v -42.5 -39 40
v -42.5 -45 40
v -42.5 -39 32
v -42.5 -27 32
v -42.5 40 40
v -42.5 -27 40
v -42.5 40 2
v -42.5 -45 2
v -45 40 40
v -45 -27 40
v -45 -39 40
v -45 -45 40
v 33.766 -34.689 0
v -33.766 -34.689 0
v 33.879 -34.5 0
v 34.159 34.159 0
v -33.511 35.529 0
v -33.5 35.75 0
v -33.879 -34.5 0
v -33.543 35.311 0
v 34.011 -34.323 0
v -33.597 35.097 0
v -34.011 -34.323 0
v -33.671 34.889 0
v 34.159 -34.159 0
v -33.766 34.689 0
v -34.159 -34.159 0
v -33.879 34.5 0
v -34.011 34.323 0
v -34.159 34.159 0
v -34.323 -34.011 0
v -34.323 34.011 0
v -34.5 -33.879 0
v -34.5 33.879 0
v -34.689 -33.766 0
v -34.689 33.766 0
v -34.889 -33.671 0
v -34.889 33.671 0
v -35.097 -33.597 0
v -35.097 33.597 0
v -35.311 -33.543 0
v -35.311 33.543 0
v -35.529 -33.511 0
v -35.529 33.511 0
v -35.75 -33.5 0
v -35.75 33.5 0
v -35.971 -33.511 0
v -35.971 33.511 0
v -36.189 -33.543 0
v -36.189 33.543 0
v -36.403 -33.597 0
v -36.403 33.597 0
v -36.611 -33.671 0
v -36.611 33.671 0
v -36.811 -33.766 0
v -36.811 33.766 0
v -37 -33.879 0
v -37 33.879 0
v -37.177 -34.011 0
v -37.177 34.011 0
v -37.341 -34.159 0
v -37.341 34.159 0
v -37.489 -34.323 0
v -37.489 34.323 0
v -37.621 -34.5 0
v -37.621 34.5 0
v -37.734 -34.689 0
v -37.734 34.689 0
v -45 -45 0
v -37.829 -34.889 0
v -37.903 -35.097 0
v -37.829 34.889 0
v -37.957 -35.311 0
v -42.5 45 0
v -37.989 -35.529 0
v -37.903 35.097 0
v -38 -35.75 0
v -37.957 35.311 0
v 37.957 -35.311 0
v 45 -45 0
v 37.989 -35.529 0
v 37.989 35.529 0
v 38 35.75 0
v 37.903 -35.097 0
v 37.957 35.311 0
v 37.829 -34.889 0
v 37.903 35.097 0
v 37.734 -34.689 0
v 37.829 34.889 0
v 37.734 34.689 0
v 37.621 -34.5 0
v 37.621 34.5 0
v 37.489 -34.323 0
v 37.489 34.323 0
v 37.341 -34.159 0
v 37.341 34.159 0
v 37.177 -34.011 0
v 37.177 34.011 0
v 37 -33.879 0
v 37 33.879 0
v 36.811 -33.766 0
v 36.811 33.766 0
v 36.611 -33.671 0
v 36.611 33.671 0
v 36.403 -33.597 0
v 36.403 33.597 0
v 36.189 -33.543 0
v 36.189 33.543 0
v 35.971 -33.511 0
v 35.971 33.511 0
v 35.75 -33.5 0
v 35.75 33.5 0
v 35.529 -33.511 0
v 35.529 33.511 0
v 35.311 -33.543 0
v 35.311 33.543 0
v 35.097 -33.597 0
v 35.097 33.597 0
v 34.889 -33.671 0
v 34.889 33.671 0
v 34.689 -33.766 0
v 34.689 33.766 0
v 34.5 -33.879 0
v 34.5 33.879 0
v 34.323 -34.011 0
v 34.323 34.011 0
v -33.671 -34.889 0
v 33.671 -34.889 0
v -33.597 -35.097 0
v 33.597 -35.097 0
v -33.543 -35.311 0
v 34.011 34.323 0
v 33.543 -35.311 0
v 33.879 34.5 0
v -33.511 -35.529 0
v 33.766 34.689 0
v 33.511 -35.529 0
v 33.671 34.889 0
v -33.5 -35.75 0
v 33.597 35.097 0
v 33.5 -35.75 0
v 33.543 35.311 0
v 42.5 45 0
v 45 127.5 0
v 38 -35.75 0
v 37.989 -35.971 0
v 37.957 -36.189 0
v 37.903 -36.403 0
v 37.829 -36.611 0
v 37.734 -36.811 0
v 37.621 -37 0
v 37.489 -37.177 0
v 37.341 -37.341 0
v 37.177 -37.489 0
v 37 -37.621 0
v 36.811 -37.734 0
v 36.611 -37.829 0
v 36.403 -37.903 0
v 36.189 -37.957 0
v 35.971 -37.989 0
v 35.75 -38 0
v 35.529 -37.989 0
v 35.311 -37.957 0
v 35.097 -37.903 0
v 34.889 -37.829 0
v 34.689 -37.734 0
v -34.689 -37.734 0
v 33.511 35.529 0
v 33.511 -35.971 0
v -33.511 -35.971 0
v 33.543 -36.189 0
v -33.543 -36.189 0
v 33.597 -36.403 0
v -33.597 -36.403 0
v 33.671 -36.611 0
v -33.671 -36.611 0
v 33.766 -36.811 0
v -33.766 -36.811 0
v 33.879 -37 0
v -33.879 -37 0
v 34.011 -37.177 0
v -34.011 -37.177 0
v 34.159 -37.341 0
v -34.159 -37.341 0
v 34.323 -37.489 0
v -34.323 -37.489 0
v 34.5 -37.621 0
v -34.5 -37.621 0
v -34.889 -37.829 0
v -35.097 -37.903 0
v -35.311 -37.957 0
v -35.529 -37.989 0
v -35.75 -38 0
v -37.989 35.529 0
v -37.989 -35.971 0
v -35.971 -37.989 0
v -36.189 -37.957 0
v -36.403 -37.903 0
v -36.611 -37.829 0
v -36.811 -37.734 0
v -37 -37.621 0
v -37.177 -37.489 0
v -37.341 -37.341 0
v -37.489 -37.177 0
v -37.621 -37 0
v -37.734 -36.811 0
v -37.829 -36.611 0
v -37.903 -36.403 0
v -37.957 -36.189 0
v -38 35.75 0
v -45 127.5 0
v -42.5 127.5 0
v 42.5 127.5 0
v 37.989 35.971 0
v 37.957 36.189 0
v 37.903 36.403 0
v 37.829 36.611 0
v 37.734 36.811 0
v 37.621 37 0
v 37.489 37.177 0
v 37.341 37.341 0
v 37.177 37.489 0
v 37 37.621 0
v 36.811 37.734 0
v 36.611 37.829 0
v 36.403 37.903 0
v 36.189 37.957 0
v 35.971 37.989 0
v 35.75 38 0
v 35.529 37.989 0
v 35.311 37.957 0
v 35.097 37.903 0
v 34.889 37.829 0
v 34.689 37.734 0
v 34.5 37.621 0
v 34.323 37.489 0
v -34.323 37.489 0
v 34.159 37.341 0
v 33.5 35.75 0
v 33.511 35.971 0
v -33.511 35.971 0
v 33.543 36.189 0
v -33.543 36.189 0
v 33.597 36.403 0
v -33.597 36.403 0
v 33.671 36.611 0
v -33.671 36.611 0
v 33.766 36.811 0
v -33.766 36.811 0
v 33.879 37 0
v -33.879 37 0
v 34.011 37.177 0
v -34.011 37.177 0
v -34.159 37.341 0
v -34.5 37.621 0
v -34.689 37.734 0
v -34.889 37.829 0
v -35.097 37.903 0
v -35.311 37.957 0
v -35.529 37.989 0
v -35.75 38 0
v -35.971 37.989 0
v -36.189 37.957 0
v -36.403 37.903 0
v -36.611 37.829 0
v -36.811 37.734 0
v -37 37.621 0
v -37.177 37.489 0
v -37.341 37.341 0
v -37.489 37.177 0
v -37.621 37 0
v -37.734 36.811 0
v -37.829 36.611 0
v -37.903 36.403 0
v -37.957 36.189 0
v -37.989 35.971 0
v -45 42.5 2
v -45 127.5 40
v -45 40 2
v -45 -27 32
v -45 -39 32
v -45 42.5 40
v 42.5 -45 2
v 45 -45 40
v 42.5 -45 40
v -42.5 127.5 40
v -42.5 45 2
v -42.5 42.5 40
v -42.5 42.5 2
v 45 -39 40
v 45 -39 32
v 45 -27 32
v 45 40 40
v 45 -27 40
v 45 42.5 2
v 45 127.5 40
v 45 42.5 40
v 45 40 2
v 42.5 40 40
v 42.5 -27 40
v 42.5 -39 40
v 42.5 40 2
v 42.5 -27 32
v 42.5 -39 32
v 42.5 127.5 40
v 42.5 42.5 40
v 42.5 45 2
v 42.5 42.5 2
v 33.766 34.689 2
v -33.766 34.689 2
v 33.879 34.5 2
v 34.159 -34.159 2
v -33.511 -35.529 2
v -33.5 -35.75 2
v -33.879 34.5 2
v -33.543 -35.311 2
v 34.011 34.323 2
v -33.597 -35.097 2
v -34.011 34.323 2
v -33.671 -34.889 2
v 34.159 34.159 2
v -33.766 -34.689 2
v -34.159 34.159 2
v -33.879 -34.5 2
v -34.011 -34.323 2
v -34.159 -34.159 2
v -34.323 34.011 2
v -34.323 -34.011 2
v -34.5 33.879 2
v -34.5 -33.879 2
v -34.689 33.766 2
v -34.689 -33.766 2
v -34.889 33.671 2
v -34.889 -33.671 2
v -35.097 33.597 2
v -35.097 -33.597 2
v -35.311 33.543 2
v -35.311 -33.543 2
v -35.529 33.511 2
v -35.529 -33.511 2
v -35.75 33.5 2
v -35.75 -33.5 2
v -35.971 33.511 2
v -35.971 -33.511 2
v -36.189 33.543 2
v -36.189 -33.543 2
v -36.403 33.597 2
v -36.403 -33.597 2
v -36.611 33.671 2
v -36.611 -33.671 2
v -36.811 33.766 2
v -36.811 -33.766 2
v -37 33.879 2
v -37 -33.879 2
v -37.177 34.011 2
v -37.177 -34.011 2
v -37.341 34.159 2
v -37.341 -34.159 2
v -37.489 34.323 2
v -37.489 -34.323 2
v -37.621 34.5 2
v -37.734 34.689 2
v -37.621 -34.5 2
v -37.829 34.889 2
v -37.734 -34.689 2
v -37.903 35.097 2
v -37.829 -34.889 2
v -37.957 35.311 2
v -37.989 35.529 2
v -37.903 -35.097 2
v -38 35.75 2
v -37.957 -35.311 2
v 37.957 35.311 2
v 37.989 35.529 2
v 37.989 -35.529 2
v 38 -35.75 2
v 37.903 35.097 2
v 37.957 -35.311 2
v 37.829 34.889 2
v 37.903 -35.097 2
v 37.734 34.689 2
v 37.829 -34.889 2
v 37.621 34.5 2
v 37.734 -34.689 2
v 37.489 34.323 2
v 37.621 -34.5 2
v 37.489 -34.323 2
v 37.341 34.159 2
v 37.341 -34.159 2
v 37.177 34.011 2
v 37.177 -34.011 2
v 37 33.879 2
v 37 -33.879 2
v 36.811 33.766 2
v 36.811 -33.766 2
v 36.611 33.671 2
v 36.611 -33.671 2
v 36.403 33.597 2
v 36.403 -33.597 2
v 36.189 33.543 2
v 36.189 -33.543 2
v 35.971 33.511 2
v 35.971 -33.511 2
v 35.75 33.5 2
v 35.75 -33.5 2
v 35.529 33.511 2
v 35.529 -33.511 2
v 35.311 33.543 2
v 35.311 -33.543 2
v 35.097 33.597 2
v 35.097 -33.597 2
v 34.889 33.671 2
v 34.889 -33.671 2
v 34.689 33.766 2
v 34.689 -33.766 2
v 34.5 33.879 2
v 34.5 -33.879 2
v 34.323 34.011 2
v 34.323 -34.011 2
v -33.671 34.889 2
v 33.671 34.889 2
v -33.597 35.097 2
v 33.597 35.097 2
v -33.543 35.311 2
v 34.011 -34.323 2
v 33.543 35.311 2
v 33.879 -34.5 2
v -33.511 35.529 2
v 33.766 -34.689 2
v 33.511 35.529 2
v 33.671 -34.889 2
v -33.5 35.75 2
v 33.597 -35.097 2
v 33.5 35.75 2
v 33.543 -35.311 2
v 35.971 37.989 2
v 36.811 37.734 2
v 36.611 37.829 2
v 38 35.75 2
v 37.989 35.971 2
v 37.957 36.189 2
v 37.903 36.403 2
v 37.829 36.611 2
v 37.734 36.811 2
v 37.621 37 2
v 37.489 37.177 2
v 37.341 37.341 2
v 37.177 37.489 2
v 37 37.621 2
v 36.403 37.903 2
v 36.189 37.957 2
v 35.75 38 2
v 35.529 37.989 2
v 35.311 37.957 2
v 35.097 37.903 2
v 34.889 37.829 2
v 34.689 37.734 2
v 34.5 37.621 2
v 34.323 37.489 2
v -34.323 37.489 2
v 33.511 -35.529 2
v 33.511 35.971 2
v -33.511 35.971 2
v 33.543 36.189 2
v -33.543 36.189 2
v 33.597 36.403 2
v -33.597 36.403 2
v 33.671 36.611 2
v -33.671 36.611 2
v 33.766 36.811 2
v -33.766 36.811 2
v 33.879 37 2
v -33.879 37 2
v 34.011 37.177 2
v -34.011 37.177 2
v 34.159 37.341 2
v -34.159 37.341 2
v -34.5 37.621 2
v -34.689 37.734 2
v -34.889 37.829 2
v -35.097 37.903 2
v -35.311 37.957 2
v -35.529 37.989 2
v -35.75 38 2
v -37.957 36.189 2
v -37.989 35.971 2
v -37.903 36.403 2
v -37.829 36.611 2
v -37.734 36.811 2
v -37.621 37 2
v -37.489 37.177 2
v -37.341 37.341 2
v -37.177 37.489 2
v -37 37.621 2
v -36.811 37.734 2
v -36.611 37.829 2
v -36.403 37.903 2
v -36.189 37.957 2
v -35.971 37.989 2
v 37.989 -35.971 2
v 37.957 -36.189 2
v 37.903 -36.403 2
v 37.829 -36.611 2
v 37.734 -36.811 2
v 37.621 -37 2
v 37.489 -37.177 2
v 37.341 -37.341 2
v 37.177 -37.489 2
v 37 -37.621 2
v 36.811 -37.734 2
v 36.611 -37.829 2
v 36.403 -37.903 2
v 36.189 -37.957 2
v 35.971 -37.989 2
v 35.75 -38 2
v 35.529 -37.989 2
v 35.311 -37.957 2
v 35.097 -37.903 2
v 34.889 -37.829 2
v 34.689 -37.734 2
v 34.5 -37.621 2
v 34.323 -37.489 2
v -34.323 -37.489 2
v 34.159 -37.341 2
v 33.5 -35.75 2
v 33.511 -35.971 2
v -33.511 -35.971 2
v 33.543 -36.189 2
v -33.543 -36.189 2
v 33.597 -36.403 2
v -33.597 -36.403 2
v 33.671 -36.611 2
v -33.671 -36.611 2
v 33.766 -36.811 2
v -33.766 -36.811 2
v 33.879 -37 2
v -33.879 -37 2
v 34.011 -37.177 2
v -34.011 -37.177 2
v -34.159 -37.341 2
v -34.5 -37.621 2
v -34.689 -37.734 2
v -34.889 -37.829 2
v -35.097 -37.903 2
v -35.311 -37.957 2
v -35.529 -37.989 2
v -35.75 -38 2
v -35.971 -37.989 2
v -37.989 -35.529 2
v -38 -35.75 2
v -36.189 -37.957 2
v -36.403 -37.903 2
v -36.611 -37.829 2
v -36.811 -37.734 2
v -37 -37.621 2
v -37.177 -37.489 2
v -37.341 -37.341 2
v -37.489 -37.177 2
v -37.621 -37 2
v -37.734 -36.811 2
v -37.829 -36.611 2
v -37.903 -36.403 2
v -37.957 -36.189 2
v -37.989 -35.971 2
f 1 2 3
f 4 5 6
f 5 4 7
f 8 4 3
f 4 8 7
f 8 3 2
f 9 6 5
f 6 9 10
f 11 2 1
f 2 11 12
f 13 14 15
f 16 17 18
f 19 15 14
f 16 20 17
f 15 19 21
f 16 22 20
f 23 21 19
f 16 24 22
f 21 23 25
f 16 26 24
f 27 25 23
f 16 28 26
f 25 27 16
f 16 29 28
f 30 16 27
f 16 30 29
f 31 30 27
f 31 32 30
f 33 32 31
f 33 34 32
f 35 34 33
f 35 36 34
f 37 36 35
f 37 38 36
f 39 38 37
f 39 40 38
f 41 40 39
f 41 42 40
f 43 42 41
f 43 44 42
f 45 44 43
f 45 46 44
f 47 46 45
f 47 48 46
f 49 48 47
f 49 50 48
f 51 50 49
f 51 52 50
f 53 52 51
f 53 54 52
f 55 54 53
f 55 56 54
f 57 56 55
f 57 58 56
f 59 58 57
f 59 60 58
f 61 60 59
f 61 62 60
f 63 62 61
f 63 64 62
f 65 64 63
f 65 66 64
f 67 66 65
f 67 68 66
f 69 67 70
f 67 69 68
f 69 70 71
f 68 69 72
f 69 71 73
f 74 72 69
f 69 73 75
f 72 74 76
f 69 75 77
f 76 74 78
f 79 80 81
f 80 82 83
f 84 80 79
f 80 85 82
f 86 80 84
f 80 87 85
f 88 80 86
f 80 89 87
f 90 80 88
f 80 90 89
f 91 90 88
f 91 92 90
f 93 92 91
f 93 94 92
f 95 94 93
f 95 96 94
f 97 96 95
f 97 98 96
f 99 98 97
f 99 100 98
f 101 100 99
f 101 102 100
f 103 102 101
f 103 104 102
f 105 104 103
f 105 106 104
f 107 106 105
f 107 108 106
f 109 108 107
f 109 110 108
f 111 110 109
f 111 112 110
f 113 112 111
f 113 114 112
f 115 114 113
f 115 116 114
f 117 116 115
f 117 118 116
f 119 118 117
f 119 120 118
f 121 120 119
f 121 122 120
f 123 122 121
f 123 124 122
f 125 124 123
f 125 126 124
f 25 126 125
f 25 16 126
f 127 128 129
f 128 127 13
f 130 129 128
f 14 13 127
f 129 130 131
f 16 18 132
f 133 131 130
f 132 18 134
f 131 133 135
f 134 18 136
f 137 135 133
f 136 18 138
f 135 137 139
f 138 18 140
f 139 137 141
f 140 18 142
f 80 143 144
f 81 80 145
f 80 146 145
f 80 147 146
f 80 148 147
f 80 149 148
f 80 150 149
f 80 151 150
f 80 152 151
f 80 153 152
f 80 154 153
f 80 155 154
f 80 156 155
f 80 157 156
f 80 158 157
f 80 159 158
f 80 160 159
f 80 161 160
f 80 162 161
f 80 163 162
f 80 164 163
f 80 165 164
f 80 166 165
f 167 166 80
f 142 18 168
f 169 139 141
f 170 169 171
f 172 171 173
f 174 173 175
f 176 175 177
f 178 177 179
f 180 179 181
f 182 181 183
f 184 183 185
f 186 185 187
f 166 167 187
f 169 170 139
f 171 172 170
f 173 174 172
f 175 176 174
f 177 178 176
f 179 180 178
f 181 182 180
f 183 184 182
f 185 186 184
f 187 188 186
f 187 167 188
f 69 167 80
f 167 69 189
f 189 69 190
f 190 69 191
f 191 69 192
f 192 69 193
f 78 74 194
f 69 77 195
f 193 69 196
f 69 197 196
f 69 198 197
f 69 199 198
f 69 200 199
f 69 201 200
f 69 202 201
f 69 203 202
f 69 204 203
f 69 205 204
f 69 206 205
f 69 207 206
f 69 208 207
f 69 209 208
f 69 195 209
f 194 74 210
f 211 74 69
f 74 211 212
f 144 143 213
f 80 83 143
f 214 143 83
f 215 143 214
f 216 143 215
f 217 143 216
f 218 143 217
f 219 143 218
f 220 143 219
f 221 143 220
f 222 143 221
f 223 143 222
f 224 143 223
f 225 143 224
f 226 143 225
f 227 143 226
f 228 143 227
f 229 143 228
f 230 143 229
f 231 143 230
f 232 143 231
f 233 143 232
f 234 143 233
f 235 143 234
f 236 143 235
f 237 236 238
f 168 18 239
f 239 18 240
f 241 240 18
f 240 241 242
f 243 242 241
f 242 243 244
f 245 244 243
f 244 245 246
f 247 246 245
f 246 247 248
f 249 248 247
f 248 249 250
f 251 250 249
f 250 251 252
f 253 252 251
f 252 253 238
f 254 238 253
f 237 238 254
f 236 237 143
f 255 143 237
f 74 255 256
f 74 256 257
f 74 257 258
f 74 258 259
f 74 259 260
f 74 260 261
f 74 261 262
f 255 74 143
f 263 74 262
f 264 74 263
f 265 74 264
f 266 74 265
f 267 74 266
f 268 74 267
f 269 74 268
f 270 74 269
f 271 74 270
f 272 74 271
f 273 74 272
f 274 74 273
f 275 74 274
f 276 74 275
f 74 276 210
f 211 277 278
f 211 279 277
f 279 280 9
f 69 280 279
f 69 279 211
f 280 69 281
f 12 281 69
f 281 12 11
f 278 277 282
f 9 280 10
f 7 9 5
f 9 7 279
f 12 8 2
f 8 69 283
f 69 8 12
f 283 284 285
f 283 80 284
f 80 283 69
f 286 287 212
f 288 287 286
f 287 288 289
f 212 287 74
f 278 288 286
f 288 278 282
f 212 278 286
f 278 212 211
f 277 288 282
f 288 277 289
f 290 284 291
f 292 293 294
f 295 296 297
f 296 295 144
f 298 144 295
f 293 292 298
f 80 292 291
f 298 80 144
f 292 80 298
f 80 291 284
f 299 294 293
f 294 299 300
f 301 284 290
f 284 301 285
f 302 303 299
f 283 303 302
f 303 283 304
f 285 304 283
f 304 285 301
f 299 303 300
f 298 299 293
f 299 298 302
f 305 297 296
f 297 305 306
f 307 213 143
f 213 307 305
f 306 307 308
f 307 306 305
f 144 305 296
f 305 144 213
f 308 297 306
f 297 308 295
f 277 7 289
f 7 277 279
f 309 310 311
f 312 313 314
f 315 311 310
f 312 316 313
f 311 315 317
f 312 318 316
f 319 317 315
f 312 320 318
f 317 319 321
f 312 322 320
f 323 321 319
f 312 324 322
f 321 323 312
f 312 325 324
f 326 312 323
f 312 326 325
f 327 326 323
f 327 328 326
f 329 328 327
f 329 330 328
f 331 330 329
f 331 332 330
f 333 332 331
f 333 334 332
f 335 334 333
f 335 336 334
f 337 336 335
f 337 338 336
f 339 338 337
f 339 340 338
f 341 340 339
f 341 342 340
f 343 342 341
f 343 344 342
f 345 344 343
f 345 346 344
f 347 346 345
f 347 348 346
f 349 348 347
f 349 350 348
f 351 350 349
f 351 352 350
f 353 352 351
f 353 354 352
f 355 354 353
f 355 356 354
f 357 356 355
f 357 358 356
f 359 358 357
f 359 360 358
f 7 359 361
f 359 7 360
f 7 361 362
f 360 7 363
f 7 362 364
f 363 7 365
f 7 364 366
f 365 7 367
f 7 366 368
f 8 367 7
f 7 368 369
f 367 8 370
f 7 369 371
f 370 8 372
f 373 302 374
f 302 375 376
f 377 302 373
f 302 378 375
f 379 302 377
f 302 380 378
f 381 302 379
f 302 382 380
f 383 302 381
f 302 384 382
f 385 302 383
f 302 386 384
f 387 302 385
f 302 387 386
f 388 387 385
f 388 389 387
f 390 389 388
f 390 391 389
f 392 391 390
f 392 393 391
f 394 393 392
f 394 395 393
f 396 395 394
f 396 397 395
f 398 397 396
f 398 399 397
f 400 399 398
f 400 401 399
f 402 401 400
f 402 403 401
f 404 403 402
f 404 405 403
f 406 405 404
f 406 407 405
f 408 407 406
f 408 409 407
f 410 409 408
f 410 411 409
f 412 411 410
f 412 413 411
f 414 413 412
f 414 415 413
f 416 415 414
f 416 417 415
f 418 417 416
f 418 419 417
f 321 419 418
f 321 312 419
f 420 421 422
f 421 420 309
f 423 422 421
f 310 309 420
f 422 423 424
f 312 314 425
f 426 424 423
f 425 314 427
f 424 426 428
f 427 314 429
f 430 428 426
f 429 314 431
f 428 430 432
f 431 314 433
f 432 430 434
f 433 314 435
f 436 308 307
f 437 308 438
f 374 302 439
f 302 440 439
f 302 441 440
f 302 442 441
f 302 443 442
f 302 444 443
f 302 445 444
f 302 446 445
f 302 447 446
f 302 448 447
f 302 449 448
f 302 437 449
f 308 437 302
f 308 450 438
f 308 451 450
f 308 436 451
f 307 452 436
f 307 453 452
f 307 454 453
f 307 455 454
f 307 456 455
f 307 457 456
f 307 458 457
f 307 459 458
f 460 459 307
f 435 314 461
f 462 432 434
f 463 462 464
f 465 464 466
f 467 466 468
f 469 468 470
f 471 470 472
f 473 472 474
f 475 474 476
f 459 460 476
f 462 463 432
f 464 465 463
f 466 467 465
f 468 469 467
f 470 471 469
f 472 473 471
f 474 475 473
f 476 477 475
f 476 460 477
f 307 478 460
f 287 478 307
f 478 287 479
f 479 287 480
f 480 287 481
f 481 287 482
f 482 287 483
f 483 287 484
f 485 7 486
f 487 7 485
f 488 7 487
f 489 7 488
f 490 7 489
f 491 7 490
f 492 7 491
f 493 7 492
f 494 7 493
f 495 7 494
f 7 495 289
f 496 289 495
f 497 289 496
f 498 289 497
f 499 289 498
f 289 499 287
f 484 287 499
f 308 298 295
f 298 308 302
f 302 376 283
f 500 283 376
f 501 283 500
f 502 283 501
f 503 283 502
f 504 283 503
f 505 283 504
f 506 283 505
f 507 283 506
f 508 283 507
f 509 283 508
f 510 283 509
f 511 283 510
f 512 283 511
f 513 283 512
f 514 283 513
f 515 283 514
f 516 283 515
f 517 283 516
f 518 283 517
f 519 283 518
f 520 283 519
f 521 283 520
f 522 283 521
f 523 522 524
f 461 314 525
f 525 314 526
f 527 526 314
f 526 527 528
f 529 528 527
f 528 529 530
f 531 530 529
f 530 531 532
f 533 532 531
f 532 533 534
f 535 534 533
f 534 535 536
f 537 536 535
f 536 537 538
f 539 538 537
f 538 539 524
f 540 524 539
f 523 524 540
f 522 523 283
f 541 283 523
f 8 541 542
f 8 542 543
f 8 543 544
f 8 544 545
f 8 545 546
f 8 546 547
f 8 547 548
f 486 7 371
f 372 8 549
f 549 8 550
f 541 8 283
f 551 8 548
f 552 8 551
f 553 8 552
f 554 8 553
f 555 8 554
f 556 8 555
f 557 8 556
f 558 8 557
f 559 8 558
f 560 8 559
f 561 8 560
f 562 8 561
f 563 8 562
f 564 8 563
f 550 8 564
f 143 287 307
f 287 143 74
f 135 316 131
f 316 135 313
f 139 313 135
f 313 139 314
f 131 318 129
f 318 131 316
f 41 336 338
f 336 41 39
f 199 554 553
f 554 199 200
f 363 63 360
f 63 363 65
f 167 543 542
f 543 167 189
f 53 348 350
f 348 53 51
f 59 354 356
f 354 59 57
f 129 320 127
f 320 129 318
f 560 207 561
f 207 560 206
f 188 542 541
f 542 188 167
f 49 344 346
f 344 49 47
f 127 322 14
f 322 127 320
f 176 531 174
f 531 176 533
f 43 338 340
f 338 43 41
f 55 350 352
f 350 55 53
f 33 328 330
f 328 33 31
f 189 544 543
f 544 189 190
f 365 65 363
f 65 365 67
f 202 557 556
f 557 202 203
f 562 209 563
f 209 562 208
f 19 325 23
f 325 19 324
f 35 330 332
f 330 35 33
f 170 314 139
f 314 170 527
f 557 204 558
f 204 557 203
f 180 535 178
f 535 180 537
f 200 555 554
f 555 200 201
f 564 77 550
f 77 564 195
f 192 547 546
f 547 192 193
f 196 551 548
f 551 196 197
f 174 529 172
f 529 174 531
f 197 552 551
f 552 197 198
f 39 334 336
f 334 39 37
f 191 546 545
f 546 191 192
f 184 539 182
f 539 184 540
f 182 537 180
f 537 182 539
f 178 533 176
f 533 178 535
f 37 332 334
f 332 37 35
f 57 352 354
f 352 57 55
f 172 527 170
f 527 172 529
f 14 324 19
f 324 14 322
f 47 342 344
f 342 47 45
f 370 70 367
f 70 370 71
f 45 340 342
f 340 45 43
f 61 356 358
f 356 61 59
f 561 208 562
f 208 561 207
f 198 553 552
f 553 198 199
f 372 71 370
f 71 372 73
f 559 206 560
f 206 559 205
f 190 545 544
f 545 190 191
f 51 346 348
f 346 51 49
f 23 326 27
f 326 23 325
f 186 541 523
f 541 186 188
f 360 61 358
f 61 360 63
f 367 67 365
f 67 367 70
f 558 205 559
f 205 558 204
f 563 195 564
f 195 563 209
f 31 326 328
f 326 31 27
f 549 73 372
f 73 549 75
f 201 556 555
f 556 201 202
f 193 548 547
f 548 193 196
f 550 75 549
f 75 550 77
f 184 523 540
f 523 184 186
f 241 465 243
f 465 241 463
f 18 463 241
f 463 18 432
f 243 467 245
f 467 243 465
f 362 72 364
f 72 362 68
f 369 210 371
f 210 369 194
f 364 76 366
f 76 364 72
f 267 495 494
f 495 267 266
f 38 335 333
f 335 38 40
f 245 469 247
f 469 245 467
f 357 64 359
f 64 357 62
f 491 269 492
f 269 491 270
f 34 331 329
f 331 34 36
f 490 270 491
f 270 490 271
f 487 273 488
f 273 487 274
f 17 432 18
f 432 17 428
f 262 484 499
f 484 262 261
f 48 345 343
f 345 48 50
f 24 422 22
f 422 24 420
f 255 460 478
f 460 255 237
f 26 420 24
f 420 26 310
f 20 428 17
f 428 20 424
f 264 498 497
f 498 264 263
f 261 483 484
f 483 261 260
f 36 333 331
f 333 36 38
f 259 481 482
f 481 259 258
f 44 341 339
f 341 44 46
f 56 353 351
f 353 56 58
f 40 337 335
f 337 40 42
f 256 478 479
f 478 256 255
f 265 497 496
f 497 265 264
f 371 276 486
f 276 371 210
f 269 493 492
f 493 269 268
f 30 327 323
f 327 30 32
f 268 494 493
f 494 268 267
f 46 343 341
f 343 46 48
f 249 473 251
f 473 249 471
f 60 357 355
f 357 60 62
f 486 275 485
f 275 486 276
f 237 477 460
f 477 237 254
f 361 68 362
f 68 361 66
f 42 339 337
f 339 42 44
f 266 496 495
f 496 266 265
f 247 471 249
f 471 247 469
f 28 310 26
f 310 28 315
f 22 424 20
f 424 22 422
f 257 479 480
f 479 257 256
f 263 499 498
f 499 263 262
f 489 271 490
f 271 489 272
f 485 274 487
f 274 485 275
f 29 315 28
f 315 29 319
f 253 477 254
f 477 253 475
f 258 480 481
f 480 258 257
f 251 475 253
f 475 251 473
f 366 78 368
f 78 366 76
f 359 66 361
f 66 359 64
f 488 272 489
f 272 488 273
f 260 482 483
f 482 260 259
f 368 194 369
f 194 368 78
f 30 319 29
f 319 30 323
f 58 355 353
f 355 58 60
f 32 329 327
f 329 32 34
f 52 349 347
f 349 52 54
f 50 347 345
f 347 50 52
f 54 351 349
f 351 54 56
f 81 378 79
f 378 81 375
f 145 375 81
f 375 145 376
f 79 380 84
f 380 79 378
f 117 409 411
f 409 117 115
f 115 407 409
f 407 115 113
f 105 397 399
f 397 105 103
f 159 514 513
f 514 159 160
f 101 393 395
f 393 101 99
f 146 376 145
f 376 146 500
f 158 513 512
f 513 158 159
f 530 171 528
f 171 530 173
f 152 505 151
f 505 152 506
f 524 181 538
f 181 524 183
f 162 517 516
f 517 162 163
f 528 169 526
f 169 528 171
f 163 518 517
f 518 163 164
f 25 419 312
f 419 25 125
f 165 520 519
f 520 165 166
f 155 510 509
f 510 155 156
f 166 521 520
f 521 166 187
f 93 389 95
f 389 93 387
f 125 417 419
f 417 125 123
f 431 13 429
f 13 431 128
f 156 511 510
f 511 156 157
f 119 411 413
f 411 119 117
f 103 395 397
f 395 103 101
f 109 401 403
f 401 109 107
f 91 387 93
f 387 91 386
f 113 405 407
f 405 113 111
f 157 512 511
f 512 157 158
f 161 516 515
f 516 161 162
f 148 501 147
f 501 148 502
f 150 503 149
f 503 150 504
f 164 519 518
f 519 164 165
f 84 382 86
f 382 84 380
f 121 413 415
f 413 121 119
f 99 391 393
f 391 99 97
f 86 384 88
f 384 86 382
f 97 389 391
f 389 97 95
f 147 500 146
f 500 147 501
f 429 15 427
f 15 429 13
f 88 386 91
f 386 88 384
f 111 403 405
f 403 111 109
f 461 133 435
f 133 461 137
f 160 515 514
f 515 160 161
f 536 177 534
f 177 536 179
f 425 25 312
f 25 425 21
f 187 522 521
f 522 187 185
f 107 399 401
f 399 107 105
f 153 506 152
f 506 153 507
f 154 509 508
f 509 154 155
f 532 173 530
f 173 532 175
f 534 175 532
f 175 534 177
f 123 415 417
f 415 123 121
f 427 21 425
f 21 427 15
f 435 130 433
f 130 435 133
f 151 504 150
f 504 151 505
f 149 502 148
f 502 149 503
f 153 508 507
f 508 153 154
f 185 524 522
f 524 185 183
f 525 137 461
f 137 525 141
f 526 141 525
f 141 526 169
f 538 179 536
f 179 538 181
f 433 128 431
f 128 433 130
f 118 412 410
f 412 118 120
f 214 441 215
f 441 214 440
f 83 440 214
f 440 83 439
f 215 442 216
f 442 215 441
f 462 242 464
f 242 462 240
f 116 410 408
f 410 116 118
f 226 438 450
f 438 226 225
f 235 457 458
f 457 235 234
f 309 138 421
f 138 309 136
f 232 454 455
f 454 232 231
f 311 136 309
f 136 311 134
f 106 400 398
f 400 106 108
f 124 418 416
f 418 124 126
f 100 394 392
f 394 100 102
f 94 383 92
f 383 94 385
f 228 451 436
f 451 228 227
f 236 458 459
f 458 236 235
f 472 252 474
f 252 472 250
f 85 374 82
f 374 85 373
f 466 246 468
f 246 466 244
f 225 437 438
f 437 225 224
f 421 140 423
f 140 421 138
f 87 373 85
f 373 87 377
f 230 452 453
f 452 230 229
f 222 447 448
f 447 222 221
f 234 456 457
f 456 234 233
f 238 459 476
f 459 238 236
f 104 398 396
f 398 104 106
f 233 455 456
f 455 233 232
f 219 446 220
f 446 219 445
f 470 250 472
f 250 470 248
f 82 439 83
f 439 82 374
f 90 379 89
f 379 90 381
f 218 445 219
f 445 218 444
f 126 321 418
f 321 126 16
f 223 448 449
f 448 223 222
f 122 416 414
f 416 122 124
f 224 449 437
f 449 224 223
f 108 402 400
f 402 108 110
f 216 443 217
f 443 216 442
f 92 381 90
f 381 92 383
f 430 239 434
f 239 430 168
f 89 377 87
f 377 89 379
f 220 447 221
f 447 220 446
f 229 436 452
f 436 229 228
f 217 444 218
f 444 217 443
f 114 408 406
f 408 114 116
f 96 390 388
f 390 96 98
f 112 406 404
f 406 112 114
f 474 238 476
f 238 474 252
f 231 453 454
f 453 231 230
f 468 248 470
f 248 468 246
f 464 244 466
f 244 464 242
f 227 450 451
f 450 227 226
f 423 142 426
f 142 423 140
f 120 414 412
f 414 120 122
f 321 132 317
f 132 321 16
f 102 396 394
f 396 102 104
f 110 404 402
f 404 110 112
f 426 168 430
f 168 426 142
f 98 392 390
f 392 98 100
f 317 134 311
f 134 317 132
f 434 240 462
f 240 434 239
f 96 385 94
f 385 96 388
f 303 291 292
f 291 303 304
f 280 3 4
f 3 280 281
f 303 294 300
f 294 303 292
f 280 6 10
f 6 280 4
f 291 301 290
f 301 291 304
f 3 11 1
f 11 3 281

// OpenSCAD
// Magnetic stirrer housing for 80 mm PC case fan
// Print orientation: top plate on bed (z = 0), walls build upward (+Z)

// ---------- Dimensions ----------
plate_t      = 2;     // top plate thickness
wall_t       = 2.5;   // wall thickness
box_h        = 40;    // outer wall height (open top)
outer_x      = 90;    // outer size in X
outer_y      = 90;    // outer size in Y
hole_d       = 4.5;   // M4 screw hole diameter
hole_pitch   = 71.5;  // square pattern centre-to-centre
notch_w      = 12;    // cable notch width
notch_depth  = 8;     // notch depth from open edge (z = 32 to 40)
eps          = 0.5;   // cutter overshoot

$fn = 64;

// ---------- Model ----------
difference() {
    union() {
        // Top plate
        translate([-outer_x/2, -outer_y/2, 0])
            cube([outer_x, outer_y, plate_t]);

        // Walls (open top)
        for (sx = [-1, 1], sy = [-1, 1])
            translate([sx > 0 ? outer_x/2 - wall_t : -outer_x/2,
                       sy > 0 ? outer_y/2 - wall_t : -outer_y/2,
                       0])
                cube([wall_t, outer_y - 2*wall_t, box_h]);
    }

    // Screw holes through top plate
    for (dx = [-hole_pitch/2, hole_pitch/2], dy = [-hole_pitch/2, hole_pitch/2])
        translate([dx, dy, -eps])
            cylinder(d = hole_d, h = plate_t + 2*eps);

    // Cable notch in one wall (z = 32 to 40)
    translate([-outer_x/2, -outer_y/2 + notch_w/2, box_h - notch_depth])
        cube([outer_x, notch_w, notch_depth + eps]);
}
